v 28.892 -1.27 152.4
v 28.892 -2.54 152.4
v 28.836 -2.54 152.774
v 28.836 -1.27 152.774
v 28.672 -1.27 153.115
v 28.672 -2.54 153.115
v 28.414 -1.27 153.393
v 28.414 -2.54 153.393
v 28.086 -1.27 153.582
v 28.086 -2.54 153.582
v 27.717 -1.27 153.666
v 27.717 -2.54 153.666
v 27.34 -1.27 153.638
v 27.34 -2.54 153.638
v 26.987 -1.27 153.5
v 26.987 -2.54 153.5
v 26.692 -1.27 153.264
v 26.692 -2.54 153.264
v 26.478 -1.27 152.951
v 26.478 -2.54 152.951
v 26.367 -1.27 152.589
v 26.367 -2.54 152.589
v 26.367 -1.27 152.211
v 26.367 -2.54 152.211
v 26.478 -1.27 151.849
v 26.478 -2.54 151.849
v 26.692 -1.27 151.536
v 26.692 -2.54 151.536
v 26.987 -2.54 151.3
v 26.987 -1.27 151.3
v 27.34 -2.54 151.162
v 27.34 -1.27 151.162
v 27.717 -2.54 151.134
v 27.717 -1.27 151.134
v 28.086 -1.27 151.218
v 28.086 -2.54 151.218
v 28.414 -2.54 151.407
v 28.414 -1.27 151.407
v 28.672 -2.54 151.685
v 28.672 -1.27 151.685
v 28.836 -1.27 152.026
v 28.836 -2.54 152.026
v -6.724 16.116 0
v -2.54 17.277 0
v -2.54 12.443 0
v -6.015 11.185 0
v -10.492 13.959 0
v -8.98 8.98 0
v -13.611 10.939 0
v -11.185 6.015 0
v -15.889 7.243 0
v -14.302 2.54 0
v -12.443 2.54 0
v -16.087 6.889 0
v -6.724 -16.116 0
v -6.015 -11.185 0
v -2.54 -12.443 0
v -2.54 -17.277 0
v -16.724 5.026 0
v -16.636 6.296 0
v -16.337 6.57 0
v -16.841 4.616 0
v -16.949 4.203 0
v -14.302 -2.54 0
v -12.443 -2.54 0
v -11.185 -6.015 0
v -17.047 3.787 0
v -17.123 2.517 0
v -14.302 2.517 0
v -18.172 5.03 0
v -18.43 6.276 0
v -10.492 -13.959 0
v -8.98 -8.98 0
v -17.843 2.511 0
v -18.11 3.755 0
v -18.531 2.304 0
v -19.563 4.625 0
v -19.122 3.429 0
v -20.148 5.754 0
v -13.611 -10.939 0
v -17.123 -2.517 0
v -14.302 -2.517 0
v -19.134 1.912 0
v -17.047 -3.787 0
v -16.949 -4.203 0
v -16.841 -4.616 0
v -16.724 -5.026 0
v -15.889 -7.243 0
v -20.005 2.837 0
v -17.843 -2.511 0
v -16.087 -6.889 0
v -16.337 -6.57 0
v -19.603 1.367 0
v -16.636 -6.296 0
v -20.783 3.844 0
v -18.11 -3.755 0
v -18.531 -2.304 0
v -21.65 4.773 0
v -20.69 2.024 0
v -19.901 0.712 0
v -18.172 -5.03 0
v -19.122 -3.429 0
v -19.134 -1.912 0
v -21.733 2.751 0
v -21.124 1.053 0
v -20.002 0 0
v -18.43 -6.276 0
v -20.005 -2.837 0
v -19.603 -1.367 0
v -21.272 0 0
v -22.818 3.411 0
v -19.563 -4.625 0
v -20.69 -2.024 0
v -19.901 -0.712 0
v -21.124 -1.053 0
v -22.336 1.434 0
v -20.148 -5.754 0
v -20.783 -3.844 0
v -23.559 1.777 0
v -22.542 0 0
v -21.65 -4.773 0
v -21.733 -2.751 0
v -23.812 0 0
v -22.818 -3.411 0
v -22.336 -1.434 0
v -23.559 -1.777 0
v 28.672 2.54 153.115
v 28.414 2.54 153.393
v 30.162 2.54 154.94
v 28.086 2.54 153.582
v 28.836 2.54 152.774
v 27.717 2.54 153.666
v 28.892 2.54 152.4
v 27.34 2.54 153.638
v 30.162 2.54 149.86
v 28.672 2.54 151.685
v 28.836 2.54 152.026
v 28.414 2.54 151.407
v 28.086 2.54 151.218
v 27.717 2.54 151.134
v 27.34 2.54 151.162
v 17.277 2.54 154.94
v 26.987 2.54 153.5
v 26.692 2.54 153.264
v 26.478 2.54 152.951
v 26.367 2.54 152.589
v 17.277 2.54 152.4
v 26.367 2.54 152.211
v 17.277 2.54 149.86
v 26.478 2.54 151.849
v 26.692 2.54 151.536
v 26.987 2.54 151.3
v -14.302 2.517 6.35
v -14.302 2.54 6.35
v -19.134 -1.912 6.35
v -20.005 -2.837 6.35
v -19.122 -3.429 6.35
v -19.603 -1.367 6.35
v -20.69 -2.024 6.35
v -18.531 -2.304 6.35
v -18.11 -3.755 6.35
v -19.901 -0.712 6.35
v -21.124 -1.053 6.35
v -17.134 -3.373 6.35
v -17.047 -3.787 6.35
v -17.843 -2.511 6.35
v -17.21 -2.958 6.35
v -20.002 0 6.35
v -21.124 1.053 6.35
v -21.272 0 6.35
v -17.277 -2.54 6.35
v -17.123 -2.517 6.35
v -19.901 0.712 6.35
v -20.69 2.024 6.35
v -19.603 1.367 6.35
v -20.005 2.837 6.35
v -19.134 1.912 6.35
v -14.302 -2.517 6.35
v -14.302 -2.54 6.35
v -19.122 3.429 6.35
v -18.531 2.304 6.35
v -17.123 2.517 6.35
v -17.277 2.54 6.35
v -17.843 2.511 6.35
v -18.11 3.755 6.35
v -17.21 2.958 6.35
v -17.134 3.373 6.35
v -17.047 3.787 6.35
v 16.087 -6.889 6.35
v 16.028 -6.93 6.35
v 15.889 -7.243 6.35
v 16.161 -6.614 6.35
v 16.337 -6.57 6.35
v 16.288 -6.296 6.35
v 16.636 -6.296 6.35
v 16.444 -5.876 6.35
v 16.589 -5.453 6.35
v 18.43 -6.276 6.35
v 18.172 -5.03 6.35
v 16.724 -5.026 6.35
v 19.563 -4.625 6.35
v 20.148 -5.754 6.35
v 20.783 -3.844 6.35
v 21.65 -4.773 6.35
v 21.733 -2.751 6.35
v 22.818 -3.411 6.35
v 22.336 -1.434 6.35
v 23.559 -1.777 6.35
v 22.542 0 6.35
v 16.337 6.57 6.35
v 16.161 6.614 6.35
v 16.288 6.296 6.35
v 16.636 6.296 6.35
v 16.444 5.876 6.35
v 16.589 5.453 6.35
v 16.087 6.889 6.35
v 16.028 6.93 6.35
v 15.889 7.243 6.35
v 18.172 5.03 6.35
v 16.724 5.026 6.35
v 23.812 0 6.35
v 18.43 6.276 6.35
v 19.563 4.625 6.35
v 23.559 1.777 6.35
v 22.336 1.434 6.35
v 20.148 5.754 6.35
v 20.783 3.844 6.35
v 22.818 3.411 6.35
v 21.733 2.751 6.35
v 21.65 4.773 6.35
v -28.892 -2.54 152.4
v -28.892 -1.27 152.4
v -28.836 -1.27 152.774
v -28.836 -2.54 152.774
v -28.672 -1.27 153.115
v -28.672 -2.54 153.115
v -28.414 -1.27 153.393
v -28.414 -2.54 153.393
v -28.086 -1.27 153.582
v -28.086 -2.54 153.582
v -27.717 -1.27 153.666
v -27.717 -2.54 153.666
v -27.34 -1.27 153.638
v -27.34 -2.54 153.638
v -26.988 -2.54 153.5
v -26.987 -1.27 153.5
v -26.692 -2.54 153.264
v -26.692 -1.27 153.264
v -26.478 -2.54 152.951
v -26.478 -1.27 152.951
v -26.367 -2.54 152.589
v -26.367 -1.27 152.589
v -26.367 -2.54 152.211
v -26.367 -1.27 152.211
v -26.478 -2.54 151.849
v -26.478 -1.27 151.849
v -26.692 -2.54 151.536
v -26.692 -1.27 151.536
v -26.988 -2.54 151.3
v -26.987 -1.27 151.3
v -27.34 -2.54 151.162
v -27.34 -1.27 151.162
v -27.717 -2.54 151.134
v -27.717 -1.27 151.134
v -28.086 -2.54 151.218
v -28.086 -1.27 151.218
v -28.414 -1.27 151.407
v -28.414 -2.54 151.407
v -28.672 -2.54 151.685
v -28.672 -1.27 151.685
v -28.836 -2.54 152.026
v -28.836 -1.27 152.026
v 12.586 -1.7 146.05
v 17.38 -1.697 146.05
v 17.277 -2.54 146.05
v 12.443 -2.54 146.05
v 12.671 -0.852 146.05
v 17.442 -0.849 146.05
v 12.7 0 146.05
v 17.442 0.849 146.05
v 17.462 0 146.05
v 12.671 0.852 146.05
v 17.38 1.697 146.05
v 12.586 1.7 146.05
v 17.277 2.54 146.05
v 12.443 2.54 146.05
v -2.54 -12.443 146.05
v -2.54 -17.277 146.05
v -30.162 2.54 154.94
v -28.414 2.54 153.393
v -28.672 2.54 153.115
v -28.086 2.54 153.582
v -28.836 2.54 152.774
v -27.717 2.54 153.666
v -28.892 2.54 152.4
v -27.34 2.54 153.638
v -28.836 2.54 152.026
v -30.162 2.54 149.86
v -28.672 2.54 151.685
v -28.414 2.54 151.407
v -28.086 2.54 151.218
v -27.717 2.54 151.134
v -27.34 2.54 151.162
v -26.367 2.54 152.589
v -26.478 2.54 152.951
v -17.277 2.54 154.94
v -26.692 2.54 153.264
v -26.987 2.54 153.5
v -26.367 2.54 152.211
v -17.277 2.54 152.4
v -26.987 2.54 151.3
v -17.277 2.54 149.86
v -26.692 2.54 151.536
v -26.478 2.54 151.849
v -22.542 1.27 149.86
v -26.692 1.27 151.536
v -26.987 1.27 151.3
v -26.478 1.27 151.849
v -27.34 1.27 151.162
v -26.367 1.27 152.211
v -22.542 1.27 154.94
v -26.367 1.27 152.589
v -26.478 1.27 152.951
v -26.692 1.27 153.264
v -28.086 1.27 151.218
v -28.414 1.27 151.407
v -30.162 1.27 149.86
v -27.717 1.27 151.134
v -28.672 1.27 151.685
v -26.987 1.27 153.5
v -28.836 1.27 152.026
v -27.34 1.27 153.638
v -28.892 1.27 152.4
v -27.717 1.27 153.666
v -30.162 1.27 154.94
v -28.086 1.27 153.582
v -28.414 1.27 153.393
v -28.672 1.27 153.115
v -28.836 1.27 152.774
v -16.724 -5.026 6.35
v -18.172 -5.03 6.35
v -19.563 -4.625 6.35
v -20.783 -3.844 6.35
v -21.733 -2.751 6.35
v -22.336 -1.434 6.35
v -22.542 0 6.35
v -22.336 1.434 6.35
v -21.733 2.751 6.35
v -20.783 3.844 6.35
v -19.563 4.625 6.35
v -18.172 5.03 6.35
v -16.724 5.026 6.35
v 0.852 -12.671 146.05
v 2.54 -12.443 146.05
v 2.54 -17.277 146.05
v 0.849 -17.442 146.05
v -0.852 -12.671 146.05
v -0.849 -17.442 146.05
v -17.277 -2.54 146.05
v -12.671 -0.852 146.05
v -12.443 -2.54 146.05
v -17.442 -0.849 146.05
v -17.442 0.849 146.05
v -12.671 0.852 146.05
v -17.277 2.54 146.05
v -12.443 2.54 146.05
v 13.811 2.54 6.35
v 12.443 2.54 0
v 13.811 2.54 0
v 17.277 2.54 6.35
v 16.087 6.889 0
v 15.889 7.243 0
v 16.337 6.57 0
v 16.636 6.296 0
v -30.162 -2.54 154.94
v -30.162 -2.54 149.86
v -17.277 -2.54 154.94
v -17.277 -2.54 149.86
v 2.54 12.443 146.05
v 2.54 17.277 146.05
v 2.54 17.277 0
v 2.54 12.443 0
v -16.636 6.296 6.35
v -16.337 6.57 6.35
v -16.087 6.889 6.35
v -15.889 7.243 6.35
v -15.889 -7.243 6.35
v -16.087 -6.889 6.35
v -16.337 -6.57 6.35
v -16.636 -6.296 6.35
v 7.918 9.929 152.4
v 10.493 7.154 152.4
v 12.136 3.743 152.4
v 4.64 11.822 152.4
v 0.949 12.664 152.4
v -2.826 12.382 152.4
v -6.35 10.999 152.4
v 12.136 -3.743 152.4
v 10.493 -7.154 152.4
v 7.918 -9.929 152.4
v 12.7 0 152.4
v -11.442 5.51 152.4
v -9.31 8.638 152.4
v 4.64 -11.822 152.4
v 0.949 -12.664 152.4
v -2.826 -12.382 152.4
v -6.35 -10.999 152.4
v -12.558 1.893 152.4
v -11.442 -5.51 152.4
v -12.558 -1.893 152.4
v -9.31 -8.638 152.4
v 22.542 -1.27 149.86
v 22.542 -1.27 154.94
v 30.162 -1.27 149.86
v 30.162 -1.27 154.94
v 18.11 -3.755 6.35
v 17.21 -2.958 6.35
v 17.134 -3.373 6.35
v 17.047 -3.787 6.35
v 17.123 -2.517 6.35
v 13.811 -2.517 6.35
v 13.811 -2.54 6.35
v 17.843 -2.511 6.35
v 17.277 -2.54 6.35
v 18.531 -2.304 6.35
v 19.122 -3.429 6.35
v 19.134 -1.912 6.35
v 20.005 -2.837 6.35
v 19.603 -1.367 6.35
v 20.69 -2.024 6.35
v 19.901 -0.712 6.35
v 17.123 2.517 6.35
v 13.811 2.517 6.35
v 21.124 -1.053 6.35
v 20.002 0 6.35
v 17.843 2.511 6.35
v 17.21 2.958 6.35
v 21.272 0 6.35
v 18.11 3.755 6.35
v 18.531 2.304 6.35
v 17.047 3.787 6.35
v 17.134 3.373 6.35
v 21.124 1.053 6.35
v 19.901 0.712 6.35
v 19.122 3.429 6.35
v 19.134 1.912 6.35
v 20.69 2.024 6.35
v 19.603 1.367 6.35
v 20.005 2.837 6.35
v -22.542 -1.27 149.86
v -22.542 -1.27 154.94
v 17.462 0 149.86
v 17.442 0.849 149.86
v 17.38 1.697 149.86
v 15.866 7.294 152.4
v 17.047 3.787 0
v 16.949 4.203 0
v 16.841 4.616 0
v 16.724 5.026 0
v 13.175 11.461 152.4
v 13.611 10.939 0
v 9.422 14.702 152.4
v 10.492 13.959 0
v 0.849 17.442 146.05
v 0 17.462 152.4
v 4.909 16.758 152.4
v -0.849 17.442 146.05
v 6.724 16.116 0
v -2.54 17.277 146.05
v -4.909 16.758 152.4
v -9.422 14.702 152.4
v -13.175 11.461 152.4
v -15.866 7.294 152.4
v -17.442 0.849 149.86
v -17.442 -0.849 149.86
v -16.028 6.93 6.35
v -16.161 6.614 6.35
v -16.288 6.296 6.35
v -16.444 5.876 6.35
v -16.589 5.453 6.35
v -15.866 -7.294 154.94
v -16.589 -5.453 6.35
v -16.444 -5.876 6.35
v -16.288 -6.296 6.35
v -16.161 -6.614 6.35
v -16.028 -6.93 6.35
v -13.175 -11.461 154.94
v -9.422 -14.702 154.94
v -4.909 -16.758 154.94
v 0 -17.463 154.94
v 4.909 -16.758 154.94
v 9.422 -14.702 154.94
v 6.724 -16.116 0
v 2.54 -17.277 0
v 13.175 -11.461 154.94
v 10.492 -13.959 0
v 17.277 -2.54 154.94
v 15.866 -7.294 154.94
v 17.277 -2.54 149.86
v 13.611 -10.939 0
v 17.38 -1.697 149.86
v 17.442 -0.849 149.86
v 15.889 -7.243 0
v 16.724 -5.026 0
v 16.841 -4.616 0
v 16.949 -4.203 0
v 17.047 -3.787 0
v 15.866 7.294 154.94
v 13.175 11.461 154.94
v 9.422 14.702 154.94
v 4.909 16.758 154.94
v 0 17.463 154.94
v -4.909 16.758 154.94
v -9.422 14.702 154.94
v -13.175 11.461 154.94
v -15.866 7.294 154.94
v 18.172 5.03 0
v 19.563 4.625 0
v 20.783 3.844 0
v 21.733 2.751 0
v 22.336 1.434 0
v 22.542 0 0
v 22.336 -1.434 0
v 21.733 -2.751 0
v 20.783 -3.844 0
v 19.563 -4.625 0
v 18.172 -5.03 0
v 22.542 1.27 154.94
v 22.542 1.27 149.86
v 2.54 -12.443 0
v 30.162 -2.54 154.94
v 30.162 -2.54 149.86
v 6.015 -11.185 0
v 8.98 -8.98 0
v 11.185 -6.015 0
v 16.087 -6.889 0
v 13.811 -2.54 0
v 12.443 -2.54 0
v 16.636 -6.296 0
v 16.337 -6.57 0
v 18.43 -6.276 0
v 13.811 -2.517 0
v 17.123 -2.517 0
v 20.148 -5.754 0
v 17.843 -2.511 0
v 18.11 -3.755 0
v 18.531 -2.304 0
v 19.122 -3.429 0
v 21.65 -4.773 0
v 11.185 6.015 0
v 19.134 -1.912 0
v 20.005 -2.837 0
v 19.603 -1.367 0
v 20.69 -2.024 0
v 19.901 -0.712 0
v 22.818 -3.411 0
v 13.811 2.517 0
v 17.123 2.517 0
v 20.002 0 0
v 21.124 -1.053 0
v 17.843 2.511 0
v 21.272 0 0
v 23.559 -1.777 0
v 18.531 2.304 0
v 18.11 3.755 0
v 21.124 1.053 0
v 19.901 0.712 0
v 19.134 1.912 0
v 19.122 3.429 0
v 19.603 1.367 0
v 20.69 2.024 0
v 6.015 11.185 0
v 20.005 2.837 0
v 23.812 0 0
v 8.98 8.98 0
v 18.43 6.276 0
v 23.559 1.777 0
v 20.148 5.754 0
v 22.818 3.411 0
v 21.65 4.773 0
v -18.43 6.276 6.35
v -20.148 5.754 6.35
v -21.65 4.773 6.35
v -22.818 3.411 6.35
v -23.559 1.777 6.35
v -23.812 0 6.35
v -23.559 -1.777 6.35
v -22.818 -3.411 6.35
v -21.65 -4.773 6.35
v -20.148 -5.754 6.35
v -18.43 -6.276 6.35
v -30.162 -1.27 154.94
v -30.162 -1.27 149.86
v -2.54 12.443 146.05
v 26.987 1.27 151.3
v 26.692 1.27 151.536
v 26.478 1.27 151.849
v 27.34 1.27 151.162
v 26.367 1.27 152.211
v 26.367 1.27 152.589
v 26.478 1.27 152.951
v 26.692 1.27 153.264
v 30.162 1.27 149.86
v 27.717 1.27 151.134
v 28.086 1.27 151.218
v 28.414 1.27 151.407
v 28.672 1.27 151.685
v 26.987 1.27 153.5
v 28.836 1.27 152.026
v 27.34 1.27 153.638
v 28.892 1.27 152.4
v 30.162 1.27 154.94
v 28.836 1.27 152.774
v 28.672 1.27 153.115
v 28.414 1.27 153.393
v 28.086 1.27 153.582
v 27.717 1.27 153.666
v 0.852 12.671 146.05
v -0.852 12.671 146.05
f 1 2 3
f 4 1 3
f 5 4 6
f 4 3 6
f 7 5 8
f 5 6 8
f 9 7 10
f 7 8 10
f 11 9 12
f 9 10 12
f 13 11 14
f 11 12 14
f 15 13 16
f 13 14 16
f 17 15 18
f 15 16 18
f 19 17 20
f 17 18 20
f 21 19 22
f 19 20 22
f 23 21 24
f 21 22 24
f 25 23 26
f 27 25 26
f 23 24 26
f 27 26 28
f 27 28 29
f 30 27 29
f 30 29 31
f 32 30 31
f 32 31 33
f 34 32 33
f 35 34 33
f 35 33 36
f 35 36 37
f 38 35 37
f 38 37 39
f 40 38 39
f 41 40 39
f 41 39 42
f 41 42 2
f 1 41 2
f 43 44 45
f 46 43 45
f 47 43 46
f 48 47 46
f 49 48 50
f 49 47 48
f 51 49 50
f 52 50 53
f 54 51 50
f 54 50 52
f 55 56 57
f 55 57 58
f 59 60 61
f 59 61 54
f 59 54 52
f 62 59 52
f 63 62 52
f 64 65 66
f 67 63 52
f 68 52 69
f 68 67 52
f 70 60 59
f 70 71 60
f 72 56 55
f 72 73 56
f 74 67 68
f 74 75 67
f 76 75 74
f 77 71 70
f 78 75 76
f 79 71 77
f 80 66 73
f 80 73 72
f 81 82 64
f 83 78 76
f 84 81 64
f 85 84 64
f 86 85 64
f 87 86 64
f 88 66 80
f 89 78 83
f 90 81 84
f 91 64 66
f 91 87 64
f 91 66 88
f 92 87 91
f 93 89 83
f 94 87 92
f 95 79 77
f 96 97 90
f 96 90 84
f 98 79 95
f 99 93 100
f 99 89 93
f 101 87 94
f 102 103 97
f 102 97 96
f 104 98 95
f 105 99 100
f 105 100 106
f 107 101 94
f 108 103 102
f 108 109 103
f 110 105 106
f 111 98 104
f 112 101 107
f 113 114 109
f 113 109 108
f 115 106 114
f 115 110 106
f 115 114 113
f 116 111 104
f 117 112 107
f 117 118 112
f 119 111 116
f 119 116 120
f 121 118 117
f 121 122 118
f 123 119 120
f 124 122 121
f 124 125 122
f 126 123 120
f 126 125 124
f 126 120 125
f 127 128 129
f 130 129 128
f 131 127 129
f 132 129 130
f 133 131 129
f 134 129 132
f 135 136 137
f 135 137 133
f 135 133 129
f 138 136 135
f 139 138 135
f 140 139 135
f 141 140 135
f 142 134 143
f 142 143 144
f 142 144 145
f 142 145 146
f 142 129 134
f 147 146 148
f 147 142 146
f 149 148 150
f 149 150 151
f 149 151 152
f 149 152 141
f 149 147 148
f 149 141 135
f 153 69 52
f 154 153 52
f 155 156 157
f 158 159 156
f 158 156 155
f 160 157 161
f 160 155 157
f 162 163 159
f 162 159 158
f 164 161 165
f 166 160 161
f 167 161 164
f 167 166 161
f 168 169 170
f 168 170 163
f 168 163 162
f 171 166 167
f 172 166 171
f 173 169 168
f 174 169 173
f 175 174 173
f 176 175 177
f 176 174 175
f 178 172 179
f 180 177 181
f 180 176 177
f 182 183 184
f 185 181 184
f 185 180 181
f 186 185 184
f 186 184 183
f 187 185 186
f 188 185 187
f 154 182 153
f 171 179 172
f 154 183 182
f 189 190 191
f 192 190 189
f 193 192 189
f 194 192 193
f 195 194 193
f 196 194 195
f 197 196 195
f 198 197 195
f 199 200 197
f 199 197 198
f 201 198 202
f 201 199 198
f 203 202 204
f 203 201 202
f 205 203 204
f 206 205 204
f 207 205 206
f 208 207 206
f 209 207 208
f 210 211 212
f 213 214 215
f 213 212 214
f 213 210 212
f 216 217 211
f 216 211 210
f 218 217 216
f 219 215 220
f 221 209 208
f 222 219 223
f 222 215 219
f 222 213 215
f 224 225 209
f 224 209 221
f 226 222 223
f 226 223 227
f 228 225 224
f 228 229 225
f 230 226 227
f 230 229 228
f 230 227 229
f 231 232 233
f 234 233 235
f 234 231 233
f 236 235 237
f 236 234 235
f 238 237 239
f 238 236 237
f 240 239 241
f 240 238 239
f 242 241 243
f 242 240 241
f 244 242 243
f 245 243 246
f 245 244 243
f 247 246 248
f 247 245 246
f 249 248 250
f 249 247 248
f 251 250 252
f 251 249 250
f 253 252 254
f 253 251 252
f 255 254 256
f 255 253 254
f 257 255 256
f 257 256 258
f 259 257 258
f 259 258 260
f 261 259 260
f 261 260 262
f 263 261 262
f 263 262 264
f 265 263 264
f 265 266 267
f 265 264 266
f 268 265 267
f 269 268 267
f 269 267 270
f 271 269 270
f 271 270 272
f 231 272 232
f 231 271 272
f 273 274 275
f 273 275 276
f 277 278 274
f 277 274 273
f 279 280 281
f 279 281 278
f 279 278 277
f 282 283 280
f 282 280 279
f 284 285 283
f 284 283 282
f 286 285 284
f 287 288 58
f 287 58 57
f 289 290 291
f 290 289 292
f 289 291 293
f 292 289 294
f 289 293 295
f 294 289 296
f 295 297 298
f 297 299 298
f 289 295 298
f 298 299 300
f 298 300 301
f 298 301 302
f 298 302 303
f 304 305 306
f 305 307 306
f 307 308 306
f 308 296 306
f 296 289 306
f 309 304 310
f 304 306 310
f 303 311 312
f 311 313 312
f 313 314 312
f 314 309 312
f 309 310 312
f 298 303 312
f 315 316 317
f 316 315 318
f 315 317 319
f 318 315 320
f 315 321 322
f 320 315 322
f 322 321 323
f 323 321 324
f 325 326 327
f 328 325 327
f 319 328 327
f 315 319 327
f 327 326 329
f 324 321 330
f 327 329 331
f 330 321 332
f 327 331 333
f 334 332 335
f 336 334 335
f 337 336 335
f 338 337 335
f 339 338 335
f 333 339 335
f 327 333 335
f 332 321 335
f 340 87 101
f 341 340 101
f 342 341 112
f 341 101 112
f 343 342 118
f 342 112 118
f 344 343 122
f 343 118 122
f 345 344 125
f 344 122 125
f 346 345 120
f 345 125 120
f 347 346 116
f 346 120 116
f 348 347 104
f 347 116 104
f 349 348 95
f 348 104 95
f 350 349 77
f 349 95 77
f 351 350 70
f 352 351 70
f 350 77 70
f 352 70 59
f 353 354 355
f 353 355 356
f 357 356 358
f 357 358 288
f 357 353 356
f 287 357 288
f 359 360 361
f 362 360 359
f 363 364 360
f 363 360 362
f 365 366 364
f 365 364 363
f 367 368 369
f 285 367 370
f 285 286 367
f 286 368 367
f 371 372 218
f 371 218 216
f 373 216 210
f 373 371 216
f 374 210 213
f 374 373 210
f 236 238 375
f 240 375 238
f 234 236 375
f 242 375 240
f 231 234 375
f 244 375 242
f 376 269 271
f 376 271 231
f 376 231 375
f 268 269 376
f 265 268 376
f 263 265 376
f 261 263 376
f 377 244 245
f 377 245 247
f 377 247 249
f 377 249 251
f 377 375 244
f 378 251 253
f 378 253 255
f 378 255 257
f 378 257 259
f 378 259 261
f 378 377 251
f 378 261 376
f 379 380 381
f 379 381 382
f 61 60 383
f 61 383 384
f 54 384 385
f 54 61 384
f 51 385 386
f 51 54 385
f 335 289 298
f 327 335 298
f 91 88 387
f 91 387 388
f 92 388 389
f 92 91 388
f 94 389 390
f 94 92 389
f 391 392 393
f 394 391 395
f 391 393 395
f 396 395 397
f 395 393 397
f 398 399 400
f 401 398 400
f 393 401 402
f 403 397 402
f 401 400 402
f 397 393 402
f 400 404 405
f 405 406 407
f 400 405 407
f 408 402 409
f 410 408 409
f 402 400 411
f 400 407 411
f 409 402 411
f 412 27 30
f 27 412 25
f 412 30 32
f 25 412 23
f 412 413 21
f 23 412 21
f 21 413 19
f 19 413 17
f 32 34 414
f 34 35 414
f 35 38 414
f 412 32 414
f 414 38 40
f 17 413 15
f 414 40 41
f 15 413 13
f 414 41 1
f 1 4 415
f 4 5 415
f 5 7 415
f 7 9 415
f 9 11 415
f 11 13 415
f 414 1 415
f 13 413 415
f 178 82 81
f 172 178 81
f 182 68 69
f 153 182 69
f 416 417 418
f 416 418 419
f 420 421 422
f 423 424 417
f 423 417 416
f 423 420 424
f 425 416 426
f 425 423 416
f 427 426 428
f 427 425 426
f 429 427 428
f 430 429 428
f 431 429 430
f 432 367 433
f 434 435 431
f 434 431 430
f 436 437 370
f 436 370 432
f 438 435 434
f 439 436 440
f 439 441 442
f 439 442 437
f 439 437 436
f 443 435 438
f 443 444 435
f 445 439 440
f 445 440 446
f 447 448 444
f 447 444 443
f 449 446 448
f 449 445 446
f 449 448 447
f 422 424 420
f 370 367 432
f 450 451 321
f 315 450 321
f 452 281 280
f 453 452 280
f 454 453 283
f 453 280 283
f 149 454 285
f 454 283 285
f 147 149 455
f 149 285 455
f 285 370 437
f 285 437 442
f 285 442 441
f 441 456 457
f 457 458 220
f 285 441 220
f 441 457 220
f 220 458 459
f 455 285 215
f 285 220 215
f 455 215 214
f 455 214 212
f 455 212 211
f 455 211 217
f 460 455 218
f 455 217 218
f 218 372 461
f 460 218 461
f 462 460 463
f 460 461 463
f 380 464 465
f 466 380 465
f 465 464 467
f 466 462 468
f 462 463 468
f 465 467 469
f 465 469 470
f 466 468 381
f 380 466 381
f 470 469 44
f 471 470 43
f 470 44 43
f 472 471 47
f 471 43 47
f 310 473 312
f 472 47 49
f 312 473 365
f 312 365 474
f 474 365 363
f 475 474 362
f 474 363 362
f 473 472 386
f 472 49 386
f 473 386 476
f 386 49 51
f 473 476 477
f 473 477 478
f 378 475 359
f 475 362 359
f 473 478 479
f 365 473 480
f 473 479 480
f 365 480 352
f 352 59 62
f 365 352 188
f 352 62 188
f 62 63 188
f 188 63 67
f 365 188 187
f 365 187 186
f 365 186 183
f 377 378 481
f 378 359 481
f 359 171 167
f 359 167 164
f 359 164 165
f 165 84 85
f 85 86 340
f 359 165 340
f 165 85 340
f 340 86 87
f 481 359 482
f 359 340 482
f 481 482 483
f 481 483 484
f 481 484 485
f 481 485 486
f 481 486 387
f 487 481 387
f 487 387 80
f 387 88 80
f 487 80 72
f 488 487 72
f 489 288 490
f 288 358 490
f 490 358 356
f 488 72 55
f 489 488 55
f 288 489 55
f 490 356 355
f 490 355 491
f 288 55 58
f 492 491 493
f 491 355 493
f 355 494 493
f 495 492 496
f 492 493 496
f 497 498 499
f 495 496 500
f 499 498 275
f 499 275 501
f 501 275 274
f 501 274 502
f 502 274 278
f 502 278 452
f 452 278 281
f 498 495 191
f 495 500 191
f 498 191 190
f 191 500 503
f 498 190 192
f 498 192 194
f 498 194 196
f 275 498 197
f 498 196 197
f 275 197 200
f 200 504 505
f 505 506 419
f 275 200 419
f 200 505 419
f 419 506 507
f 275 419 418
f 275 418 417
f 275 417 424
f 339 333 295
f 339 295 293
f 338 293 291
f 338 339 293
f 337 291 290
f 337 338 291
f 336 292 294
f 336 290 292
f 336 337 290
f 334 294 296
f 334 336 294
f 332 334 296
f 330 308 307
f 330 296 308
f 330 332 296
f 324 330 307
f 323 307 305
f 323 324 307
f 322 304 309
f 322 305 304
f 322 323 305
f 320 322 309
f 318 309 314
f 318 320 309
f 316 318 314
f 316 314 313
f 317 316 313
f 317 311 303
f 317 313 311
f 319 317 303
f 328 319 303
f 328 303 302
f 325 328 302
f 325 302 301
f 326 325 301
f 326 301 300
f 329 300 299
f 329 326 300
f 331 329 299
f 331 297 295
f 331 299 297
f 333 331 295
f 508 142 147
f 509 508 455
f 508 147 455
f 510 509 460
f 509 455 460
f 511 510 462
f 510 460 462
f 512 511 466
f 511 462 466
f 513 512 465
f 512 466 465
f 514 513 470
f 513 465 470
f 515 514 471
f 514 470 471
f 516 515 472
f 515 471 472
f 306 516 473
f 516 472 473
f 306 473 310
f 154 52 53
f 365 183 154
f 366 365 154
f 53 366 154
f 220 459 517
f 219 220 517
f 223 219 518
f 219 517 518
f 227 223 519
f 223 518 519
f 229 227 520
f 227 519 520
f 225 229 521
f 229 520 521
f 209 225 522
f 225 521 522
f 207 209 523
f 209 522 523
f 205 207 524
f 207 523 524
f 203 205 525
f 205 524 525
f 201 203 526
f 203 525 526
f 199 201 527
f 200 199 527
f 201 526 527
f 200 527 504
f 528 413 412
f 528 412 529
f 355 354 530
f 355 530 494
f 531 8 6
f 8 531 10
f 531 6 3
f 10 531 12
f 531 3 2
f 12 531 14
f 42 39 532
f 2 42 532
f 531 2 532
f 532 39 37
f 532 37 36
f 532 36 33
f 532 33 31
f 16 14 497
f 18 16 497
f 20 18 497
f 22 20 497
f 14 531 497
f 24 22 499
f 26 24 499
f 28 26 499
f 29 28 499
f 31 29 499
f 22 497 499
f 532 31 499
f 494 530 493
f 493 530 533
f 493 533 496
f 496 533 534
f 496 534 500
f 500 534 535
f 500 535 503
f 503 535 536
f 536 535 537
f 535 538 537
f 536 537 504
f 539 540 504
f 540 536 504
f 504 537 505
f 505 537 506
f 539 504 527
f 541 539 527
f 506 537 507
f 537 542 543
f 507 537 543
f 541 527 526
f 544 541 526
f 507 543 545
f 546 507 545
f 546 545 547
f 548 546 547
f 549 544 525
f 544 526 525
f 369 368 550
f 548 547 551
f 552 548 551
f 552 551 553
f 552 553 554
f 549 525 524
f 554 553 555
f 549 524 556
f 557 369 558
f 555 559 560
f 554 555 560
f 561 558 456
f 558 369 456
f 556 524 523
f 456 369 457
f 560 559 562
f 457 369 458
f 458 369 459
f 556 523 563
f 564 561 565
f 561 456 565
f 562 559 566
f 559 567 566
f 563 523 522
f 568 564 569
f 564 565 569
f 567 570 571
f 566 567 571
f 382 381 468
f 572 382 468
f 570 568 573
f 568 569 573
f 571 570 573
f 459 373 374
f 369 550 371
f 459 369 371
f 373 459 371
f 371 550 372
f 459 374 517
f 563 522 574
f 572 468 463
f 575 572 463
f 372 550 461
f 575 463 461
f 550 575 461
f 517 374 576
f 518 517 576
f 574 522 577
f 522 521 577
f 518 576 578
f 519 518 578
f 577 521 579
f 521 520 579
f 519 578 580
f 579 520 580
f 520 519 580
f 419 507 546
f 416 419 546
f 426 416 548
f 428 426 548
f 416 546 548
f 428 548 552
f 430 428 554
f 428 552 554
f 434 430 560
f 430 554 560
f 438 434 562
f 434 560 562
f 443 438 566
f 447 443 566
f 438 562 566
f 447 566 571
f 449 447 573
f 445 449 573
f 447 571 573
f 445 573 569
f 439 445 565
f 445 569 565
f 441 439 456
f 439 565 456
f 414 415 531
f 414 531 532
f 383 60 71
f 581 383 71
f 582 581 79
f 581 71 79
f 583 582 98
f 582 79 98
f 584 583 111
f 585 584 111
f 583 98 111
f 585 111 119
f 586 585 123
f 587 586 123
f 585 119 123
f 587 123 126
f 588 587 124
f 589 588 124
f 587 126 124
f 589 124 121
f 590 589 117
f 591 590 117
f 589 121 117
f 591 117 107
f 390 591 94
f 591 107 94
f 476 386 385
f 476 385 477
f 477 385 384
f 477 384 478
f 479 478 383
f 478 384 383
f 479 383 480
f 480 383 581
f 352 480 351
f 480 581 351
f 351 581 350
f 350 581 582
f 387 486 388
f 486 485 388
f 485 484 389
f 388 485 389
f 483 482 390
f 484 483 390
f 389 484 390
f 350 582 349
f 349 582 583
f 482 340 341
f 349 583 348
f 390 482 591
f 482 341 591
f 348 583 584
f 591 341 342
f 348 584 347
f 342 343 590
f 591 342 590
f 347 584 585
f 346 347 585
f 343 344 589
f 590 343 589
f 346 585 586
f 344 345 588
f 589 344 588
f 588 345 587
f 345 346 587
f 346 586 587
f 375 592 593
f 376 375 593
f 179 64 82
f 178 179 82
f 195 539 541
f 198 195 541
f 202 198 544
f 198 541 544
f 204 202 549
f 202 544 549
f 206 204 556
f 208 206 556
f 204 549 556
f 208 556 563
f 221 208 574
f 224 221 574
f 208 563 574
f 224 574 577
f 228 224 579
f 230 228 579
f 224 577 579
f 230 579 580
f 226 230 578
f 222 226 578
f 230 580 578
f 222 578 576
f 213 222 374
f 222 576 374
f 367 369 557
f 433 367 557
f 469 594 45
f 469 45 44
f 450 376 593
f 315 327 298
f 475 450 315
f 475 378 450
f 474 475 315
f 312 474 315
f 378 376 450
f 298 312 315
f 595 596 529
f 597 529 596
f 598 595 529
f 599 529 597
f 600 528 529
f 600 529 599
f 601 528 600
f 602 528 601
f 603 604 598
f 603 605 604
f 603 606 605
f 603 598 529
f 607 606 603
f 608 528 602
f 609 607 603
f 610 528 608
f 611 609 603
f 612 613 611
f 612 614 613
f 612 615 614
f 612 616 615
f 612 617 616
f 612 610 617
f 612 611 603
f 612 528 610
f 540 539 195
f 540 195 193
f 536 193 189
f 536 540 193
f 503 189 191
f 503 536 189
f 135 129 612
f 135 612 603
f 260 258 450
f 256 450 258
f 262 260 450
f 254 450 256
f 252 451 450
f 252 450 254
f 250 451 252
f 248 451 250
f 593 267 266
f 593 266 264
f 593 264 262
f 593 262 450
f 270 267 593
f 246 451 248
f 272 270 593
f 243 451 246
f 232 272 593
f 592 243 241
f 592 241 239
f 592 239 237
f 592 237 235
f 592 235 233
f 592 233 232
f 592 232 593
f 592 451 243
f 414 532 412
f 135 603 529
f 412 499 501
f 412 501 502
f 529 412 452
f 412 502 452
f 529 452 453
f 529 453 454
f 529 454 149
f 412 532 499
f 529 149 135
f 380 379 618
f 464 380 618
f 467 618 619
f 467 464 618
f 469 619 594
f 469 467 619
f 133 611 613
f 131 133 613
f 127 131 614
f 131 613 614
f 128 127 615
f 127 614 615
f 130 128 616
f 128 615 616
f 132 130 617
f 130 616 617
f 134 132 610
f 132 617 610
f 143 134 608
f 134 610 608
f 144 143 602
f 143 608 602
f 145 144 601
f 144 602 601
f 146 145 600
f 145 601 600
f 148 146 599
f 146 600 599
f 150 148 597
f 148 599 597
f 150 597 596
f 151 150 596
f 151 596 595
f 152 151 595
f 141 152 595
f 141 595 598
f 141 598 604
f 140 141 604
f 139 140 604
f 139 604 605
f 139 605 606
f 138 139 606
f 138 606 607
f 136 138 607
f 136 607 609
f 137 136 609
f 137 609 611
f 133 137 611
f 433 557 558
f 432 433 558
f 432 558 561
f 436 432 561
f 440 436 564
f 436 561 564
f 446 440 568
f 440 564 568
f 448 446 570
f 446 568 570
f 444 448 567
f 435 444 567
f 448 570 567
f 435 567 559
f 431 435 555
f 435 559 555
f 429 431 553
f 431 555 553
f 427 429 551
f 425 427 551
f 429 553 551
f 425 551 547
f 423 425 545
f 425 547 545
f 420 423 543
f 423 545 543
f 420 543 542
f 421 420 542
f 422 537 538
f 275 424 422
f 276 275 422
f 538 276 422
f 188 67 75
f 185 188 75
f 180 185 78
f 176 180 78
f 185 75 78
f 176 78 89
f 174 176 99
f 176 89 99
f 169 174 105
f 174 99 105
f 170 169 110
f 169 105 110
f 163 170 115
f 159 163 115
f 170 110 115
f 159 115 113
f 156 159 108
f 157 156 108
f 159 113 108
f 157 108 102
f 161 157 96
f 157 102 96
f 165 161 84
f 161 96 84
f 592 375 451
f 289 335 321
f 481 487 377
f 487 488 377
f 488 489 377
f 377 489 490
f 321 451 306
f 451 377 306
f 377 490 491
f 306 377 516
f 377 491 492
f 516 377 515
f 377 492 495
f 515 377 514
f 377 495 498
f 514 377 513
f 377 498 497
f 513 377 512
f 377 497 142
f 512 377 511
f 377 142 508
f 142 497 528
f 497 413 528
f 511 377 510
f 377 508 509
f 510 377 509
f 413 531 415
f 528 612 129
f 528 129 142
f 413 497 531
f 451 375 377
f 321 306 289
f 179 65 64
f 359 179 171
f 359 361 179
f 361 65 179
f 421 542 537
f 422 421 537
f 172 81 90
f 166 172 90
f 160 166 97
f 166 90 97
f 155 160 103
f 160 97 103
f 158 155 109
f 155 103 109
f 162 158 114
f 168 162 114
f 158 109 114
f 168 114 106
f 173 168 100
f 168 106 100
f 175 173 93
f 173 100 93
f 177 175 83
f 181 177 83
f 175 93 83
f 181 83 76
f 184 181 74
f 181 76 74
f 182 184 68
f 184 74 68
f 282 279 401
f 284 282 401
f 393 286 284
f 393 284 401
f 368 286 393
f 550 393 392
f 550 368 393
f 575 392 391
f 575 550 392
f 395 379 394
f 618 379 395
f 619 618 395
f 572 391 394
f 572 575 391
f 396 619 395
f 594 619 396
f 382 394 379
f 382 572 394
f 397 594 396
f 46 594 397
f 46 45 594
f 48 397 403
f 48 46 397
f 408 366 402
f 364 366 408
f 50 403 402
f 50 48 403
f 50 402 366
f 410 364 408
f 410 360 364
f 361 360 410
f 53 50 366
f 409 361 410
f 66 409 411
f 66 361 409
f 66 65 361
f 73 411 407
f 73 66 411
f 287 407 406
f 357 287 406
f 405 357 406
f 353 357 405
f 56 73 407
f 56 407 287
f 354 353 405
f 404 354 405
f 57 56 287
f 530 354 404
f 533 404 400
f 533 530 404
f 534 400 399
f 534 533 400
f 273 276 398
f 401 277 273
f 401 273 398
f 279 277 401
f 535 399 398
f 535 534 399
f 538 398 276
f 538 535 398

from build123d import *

# Parameters (mm, degrees)
SKETCH1_R               = 17.4625
SKETCH1_R_2             = 12.7
EXTRUDE_THIN1_DEPTH     = 152.4
CUT_EXTRUDE1_DEPTH      = 25.4
CUT_EXTRUDE1_DEPTH_BACK = 139.7
EXTRUDE_THIN2_DEPTH     = 6.35
SKETCH4_R               = 17.4625
BOSS_EXTRUDE1_DEPTH     = 2.54
FILLET1_R               = 2.54
BOSS_EXTRUDE2_START     = -0.185715
SKETCH5_W               = 5.08
SKETCH5_H               = 5.08
BOSS_EXTRUDE2_DEPTH     = 12.885715
CUT_EXTRUDE2_REACH      = 160.812
SKETCH6_W               = 7.62
SKETCH6_H               = 2.54
SKETCH7_R               = 1.27
CUT_EXTRUDE3_DEPTH      = 160.110904757


# Read off the part's stored shape, not the designer's step: Extrude-Thin2
with BuildPart() as part:
    # Sketch1 → Extrude-Thin1 (new body)
    with BuildSketch(Plane.XY):
        Circle(SKETCH1_R)
        Circle(SKETCH1_R_2, mode=Mode.SUBTRACT)
    extrude(amount=EXTRUDE_THIN1_DEPTH)

    # Sketch2 → Cut-Extrude1 (cut, two sides: drawn at the far end of the back side and taken through both)
    with BuildSketch(Plane(origin=(0, 0, 6.35), x_dir=(-1, 0, 0), z_dir=(0, 0, -1)).offset(-CUT_EXTRUDE1_DEPTH_BACK)):
        Polygon((-2.54, 2.54), (-31.75, 2.54), (-31.75, -2.54), (-2.54, -2.54), (-2.54, -31.75), (2.54, -31.75), (2.54, -2.54), (31.75, -2.54), (31.75, 2.54), (2.54, 2.54), (2.54, 31.75), (-2.54, 31.75), align=None)
    extrude(amount=CUT_EXTRUDE1_DEPTH + CUT_EXTRUDE1_DEPTH_BACK, mode=Mode.SUBTRACT)

    # Extrude-Thin2 outline → Extrude-Thin2 (add)
    with BuildSketch(Plane.XY):
        with BuildLine():
            Line((13.81111464, 2.51726107), (17.123388359, 2.51726107))
            ThreePointArc((17.123388359, 2.51726107), (20.0025, 0), (17.123388359, -2.51726107))
            Line((17.123388359, -2.51726107), (13.81111464, -2.51726107))
            Line((13.81111464, -2.51726107), (13.81111464, -2.54))
            Line((13.81111464, -2.54), (17.276785183, -2.54))
            ThreePointArc((17.276785183, -2.54), (17.17315149, -3.165718582), (17.046863636, -3.78726107))
            ThreePointArc((17.046863636, -3.78726107), (21.2725, 0), (17.046863636, 3.78726107))
            ThreePointArc((17.046863636, 3.78726107), (17.17315149, 3.165718582), (17.276785183, 2.54))
            Line((17.276785183, 2.54), (13.81111464, 2.54))
            Line((13.81111464, 2.54), (13.81111464, 2.51726107))
        make_face()
        with BuildLine():
            ThreePointArc((16.288020729, 6.295973871), (16.518015944, 5.665161561), (16.723590909, 5.025973871))
            ThreePointArc((16.723590909, 5.025973871), (22.5425, 0), (16.723590909, -5.025973871))
            ThreePointArc((16.723590909, -5.025973871), (16.518015944, -5.665161561), (16.288020729, -6.295973871))
            Line((16.288020729, -6.295973871), (16.635932996, -6.295973871))
            ThreePointArc((16.635932996, -6.295973871), (23.8125, 0), (16.635932996, 6.295973871))
            Line((16.635932996, 6.295973871), (16.288020729, 6.295973871))
        make_face()
        with BuildLine():
            ThreePointArc((-16.723590909, 5.025973871), (-16.518015944, 5.665161561), (-16.288020729, 6.295973871))
            Line((-16.288020729, 6.295973871), (-16.635932996, 6.295973871))
            ThreePointArc((-16.635932996, 6.295973871), (-23.8125, 0), (-16.635932996, -6.295973871))
            Line((-16.635932996, -6.295973871), (-16.288020729, -6.295973871))
            ThreePointArc((-16.288020729, -6.295973871), (-16.518015944, -5.665161561), (-16.723590909, -5.025973871))
            ThreePointArc((-16.723590909, -5.025973871), (-22.5425, 0), (-16.723590909, 5.025973871))
        make_face()
        with BuildLine():
            ThreePointArc((-17.276785183, 2.54), (-17.17315149, 3.165718582), (-17.046863636, 3.78726107))
            ThreePointArc((-17.046863636, 3.78726107), (-21.2725, 0), (-17.046863636, -3.78726107))
            ThreePointArc((-17.046863636, -3.78726107), (-17.17315149, -3.165718582), (-17.276785183, -2.54))
            Line((-17.276785183, -2.54), (-14.302412139, -2.54))
            Line((-14.302412139, -2.54), (-14.302412139, -2.51726107))
            Line((-14.302412139, -2.51726107), (-17.123388359, -2.51726107))
            ThreePointArc((-17.123388359, -2.51726107), (-20.0025, 0), (-17.123388359, 2.51726107))
            Line((-17.123388359, 2.51726107), (-14.302412139, 2.51726107))
            Line((-14.302412139, 2.51726107), (-14.302412139, 2.54))
            Line((-14.302412139, 2.54), (-17.276785183, 2.54))
        make_face()
    extrude(amount=EXTRUDE_THIN2_DEPTH)

    # Sketch4 → Boss-Extrude1 (add)
    with BuildSketch(Plane.XY.offset(152.4)):
        with Locations(Location((0, 0, 0), (0, 0, 171.636398211))):
            Circle(SKETCH4_R)
    extrude(amount=BOSS_EXTRUDE1_DEPTH)

    # Fillet1
    # the kernel refuses this fillet: 2.54 mm, written as the material it adds along each edge
    with BuildSketch(Plane(origin=(-16.288020729, -6.295973871, 0), x_dir=(0.3878333084832039, -0.9217295291087142, 0), z_dir=(0, 0, 1)), Plane(origin=(16.288020729, 6.295973871, 0), x_dir=(-0.38783330848320335, 0.9217295291087143, 0), z_dir=(0, 0, 1))) as fillet1_piece_1:
        with BuildLine():
            CenterArc((1.10244597, -2.53890008), FILLET1_R, 91.686230358, 27.467637925)
            Line((-0.134931966, -0.32068101), (-0.159679524, -0.276316629))
            ThreePointArc((-0.159679524, -0.276316629), (-0.114289843, -0.140638573), (-0.04682386, 0.019701932))
            Line((-0.04682386, 0.019701932), (0.001494842, 0.050778002))
            ThreePointArc((0.001494842, 0.050778002), (0.513851935, 0.043238053), (1.026209029, 0.050778002))
            Line((1.026209029, 0.050778002), (1.027703871, 0))
        make_face()
    extrude(amount=6.35)
    with BuildSketch(Plane(origin=(-16.288020729, 6.295973871, 0), x_dir=(0.38783330848320663, 0.9217295291087131, 0), z_dir=(0, 0, 1)), Plane(origin=(16.288020729, -6.295973871, 0), x_dir=(-0.3878333084832061, -0.9217295291087134, 0), z_dir=(0, 0, 1))) as fillet1_piece_2:
        with BuildLine():
            CenterArc((1.10244597, 2.53890008), FILLET1_R, 240.846131717, 27.467637925)
            Line((-0.134931966, 0.32068101), (-0.159679524, 0.276316629))
            ThreePointArc((-0.159679524, 0.276316629), (-0.114289843, 0.140638573), (-0.04682386, -0.019701932))
            Line((-0.04682386, -0.019701932), (0.001494842, -0.050778002))
            ThreePointArc((0.001494842, -0.050778002), (0.513851935, -0.043238053), (1.026209029, -0.050778002))
            Line((1.026209029, -0.050778002), (1.027703871, 0))
        make_face()
    extrude(amount=6.35)

    # Sketch5 → Boss-Extrude2 (add)
    with BuildSketch(Plane(origin=(17.4625, 0, 146.05), x_dir=(0, 0, -1), z_dir=(1, 0, 0)).offset(BOSS_EXTRUDE2_START)):
        with Locations((-6.35, 0)):
            Rectangle(SKETCH5_W, SKETCH5_H)
    boss_extrude2 = extrude(amount=BOSS_EXTRUDE2_DEPTH)

    # Sketch6 → Cut-Extrude2 (cut, up to next)
    with BuildSketch(Plane.XY.offset(154.94), mode=Mode.PRIVATE) as cut_extrude2_sk1:
        with Locations((26.3525, 0)):
            Rectangle(SKETCH6_W, SKETCH6_H)
    cut_extrude2_tool1 = extrude(cut_extrude2_sk1.sketch, amount=-CUT_EXTRUDE2_REACH, mode=Mode.PRIVATE) & part.part
    cut_extrude2 = cut_extrude2_tool1.solids().sort_by_distance((26.3525, 0, 154.94))[0]
    add(cut_extrude2, mode=Mode.SUBTRACT)

    # Sketch7 → Cut-Extrude3 (cut, through all)
    with BuildSketch(Plane.XZ.offset(2.54)):
        with Locations((27.6225, 152.4)):
            Circle(SKETCH7_R)
    cut_extrude3 = extrude(amount=-CUT_EXTRUDE3_DEPTH, mode=Mode.SUBTRACT)

    # Mirror2: Boss-Extrude2, Cut-Extrude2, Cut-Extrude3 across plane
    add(boss_extrude2.mirror(Plane(origin=(0, 0, 0), x_dir=(0, 0, 1), z_dir=(1, 0, 0))))
    add(cut_extrude2.mirror(Plane(origin=(0, 0, 0), x_dir=(0, 0, 1), z_dir=(1, 0, 0))), mode=Mode.SUBTRACT)
    add(cut_extrude3.mirror(Plane(origin=(0, 0, 0), x_dir=(0, 0, 1), z_dir=(1, 0, 0))), mode=Mode.SUBTRACT)


solid = part.part
